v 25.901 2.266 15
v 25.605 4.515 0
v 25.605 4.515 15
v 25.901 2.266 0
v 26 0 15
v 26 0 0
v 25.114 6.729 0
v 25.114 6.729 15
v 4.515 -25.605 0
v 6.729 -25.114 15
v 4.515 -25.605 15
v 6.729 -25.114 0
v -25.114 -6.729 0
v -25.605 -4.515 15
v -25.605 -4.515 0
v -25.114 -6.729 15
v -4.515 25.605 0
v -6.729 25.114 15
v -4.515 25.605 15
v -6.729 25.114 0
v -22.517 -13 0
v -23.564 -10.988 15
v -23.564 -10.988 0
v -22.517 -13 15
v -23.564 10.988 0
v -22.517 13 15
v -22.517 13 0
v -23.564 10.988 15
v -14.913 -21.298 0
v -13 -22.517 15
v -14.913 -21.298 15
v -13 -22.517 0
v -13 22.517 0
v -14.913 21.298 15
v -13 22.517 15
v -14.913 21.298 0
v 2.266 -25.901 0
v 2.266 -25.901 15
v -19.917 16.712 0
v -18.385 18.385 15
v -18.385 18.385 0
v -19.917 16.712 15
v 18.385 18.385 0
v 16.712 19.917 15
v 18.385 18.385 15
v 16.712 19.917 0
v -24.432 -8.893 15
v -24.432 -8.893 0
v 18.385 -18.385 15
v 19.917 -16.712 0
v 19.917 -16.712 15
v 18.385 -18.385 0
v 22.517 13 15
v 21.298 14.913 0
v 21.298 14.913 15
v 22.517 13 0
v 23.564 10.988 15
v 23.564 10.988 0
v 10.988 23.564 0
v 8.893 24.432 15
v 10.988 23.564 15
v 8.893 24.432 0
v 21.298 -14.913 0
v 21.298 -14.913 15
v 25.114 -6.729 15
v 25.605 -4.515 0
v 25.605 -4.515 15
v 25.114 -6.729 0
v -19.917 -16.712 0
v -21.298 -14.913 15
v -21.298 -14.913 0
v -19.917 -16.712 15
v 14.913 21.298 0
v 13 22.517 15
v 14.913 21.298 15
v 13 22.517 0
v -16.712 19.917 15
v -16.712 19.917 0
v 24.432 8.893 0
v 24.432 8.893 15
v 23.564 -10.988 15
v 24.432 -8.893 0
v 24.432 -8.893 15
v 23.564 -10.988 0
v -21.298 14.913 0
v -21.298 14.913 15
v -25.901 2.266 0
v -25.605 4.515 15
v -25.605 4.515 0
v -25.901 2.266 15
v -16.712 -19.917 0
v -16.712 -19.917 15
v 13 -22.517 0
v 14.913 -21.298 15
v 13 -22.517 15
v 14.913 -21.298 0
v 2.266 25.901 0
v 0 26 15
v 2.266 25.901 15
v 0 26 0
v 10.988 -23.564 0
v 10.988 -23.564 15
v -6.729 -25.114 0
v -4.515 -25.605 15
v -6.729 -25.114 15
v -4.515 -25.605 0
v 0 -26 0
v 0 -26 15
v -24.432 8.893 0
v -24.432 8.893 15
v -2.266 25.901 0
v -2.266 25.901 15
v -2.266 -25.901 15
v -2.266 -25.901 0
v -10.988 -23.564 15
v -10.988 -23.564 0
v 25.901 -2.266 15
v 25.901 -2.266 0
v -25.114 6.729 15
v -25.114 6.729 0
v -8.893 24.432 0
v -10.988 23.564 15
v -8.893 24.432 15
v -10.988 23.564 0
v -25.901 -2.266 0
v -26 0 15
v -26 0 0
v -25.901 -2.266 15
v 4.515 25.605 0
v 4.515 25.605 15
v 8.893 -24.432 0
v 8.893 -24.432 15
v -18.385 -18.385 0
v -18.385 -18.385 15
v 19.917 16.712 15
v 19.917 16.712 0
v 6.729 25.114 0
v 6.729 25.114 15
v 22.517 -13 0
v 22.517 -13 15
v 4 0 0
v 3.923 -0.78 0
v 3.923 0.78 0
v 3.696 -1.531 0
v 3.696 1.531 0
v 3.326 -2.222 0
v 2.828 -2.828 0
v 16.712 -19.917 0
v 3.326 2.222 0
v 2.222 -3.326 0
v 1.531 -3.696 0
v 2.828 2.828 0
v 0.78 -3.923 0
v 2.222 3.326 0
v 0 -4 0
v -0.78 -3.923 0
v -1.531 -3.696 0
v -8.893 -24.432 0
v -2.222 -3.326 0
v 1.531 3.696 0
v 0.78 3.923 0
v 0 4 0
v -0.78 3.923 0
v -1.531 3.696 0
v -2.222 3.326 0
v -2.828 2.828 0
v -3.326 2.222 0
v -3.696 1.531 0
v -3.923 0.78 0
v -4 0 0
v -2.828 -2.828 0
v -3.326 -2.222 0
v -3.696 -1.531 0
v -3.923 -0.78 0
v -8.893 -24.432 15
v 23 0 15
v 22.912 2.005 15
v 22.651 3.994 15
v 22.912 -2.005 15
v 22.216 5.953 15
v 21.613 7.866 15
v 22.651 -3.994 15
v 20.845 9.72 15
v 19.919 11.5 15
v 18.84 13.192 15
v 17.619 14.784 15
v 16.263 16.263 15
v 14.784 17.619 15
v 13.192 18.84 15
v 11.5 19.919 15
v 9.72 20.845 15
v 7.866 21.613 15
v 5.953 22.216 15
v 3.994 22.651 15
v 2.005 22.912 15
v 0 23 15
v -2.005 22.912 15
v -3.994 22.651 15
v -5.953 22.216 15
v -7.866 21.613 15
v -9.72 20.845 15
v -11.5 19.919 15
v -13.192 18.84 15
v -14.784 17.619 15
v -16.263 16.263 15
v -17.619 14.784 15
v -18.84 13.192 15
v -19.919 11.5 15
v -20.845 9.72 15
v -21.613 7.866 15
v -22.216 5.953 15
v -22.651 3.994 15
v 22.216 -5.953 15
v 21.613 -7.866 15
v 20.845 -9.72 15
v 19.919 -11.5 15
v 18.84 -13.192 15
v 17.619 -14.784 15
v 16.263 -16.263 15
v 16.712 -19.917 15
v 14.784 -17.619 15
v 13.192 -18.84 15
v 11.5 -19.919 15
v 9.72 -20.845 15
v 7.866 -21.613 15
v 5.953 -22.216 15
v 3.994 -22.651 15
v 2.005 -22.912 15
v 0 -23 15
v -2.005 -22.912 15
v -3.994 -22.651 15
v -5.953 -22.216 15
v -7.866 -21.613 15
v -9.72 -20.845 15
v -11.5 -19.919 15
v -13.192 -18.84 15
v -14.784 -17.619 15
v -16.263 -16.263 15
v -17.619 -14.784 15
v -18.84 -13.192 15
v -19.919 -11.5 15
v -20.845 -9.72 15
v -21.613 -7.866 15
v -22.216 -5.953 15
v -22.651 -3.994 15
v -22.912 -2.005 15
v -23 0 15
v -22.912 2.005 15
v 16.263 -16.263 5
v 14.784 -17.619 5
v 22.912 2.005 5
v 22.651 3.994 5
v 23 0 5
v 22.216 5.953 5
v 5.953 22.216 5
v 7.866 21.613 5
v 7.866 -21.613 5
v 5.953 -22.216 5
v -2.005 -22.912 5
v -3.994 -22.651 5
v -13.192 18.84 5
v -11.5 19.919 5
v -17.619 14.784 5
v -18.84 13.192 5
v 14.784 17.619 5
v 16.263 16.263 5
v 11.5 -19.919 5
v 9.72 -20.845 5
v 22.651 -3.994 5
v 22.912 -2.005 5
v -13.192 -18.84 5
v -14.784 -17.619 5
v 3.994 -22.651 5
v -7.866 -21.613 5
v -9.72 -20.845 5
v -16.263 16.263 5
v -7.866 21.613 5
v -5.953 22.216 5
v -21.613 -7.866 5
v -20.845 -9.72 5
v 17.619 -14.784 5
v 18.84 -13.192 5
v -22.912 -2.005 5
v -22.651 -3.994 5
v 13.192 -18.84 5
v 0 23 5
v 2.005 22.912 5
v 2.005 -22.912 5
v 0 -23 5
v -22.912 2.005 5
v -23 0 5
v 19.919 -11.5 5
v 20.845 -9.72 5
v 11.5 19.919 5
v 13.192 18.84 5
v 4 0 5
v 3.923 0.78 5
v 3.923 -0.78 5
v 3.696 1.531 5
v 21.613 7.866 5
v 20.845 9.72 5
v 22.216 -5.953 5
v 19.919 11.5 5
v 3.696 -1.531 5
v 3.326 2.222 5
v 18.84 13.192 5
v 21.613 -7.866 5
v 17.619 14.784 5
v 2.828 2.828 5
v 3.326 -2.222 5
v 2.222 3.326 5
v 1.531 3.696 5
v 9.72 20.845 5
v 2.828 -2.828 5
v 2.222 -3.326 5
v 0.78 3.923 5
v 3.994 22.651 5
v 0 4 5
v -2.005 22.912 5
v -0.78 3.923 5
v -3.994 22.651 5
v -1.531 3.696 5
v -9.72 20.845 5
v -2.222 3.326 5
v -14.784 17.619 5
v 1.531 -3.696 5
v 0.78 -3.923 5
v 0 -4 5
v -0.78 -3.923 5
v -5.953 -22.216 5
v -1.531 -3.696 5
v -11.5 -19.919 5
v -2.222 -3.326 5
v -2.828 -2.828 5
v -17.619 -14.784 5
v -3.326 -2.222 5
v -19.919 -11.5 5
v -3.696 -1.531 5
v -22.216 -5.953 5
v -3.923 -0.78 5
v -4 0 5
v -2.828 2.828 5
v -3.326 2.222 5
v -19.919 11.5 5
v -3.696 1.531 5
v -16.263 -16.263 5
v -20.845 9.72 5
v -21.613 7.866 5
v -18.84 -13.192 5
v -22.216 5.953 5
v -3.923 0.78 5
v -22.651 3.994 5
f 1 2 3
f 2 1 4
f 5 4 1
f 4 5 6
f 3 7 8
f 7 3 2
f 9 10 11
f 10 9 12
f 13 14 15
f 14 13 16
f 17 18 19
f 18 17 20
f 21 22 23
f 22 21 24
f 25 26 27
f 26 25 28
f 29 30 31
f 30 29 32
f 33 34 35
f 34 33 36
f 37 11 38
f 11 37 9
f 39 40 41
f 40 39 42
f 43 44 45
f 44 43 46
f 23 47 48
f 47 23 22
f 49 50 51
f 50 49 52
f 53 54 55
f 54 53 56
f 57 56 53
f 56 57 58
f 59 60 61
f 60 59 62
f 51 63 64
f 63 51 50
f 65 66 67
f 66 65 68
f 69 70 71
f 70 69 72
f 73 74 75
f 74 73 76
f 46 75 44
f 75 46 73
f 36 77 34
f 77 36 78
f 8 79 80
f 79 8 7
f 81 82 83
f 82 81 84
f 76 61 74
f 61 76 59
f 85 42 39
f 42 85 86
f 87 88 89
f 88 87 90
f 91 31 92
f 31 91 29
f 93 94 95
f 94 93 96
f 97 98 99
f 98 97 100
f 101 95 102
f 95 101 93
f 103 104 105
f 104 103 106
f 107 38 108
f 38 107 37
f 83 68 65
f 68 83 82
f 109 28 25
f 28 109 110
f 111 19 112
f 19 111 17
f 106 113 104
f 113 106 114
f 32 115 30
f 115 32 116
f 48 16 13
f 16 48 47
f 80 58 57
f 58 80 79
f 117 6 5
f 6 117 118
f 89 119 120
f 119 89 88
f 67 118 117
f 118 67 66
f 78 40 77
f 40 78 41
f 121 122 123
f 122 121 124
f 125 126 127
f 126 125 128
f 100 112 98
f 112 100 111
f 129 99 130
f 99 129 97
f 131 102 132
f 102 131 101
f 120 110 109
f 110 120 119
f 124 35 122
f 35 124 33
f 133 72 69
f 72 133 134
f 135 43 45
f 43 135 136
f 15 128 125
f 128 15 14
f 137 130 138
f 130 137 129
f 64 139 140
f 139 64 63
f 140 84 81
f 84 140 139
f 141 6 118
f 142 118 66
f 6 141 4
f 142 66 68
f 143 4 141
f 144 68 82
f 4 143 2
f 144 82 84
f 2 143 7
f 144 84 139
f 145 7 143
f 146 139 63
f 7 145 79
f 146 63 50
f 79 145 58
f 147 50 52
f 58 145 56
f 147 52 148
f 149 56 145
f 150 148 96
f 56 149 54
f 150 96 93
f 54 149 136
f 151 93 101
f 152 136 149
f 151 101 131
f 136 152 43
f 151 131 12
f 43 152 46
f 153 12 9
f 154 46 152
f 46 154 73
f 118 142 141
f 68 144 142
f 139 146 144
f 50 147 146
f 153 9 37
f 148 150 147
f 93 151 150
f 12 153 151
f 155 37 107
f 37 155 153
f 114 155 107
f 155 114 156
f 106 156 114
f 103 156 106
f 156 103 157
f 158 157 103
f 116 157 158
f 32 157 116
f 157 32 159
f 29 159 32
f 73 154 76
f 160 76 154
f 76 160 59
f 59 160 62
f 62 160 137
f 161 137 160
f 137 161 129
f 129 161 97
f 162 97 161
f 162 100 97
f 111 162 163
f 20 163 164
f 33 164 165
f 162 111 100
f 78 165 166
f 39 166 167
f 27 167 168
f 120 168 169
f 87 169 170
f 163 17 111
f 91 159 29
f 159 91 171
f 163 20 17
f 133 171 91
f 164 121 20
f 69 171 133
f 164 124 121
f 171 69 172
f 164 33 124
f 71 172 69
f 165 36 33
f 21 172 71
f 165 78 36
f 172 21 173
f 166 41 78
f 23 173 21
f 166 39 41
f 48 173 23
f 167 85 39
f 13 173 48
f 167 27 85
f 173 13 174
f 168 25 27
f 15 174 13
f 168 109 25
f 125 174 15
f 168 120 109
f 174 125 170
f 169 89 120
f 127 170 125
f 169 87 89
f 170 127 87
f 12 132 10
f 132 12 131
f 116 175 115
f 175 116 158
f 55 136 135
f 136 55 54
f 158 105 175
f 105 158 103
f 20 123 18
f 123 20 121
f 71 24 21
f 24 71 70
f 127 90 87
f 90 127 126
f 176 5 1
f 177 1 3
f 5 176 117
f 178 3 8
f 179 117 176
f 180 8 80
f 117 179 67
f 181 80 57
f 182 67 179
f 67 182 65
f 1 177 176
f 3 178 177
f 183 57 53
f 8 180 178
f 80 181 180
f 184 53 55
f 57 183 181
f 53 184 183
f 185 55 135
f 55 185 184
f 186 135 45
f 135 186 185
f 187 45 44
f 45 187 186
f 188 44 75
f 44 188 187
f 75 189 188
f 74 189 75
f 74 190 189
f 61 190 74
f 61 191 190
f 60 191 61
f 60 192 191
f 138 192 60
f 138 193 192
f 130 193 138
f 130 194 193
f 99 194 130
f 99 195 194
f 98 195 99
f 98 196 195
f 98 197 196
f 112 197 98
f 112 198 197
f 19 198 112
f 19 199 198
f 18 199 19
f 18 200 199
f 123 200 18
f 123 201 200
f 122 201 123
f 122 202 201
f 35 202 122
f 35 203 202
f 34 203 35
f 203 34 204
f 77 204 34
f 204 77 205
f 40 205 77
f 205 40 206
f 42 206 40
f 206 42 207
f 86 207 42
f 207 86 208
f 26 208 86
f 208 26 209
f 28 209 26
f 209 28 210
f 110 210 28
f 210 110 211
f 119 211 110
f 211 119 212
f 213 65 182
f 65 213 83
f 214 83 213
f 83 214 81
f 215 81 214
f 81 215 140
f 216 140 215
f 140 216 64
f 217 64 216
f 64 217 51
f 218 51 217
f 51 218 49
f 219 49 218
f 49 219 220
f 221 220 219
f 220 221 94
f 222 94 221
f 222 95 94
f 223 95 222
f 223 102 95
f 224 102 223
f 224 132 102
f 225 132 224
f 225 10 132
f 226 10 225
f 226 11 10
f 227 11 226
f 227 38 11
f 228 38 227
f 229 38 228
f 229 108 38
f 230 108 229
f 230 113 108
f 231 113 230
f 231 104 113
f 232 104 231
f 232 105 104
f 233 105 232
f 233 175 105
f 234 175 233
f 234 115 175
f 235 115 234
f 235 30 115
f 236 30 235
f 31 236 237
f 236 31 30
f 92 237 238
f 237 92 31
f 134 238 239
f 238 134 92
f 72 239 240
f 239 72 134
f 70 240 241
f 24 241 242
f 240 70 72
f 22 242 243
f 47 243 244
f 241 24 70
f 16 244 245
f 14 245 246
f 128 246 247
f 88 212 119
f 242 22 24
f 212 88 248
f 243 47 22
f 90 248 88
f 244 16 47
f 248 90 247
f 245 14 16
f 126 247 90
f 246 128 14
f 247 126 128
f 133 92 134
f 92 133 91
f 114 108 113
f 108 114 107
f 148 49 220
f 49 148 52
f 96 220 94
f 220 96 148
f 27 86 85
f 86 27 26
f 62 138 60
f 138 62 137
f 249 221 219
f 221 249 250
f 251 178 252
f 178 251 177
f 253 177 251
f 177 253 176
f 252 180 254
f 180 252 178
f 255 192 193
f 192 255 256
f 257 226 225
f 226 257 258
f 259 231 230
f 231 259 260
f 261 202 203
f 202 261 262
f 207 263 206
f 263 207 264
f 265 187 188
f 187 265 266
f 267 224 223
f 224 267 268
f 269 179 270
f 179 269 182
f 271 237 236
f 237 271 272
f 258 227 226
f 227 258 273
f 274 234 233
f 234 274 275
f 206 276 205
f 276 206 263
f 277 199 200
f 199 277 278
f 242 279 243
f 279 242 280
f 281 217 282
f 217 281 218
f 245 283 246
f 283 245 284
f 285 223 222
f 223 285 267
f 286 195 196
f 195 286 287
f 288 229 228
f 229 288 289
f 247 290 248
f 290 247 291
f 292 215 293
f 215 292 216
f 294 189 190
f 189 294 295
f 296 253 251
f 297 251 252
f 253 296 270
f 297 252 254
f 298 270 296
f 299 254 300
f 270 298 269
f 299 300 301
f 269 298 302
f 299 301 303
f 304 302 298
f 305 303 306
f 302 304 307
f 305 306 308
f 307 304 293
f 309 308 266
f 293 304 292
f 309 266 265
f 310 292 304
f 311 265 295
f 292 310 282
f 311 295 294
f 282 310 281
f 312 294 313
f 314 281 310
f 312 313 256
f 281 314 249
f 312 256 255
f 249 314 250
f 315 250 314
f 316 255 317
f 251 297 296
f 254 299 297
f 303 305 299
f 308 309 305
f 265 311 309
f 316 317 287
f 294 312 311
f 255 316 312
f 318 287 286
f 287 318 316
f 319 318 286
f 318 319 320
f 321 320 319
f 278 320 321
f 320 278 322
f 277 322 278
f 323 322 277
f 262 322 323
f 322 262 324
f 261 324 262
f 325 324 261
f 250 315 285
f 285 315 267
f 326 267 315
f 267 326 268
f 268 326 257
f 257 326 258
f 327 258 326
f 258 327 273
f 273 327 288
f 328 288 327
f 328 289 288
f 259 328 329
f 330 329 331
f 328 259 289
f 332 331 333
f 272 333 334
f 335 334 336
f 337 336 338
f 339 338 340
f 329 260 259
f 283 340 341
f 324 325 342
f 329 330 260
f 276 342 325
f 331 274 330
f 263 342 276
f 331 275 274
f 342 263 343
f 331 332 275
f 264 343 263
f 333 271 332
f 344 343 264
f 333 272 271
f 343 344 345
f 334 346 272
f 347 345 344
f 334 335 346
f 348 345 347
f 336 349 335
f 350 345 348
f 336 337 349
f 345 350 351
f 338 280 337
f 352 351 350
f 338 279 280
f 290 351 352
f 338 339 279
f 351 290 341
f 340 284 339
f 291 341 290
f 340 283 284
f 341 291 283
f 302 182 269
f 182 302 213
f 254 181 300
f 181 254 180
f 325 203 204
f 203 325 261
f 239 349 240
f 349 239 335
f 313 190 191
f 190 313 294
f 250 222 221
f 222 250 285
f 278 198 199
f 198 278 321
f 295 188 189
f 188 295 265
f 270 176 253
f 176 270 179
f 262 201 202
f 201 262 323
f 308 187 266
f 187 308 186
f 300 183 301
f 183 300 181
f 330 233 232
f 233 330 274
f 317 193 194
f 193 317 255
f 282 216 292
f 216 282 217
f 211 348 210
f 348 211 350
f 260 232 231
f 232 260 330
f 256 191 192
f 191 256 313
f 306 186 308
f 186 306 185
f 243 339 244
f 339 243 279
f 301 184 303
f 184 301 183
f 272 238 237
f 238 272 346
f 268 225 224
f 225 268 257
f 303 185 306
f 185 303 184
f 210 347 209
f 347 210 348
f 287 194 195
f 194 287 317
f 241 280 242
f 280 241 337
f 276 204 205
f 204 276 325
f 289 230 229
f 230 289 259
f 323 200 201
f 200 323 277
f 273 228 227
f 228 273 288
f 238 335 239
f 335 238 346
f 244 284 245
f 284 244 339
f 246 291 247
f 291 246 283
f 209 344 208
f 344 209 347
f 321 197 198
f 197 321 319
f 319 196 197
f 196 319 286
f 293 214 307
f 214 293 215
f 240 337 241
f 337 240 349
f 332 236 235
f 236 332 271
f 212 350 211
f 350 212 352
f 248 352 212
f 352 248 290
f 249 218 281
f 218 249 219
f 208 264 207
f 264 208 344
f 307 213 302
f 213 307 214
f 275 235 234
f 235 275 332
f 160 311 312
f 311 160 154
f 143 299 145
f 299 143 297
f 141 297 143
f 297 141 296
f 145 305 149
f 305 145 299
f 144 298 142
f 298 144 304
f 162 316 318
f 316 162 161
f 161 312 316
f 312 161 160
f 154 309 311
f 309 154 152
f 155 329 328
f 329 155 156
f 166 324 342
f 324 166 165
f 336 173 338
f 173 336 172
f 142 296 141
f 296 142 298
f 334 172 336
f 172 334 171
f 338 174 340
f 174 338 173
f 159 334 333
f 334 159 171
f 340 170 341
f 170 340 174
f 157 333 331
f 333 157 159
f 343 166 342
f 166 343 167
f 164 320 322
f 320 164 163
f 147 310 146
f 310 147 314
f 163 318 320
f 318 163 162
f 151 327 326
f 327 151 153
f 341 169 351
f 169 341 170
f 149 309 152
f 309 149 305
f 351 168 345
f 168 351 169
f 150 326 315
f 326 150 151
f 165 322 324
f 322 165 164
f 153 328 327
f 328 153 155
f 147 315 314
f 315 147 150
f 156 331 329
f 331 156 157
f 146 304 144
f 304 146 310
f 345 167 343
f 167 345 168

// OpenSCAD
cup_diameter = 52;
cup_depth = 10;
wall = 3;
base_thickness = 5;
sensor_post_diameter = 16;
sensor_post_height = 8;
relief_hole = 8;

module foot_cup() {
  difference() {
    union() {
      cylinder(h = base_thickness + cup_depth, d = cup_diameter, $fn = 72);
      cylinder(h = sensor_post_height, d = sensor_post_diameter, $fn = 48);
    }

    translate([0, 0, base_thickness])
      cylinder(h = cup_depth + 0.2, d = cup_diameter - wall * 2, $fn = 72);

    translate([0, 0, -0.1])
      cylinder(h = base_thickness + 0.2, d = relief_hole, $fn = 32);
  }
}

foot_cup();
